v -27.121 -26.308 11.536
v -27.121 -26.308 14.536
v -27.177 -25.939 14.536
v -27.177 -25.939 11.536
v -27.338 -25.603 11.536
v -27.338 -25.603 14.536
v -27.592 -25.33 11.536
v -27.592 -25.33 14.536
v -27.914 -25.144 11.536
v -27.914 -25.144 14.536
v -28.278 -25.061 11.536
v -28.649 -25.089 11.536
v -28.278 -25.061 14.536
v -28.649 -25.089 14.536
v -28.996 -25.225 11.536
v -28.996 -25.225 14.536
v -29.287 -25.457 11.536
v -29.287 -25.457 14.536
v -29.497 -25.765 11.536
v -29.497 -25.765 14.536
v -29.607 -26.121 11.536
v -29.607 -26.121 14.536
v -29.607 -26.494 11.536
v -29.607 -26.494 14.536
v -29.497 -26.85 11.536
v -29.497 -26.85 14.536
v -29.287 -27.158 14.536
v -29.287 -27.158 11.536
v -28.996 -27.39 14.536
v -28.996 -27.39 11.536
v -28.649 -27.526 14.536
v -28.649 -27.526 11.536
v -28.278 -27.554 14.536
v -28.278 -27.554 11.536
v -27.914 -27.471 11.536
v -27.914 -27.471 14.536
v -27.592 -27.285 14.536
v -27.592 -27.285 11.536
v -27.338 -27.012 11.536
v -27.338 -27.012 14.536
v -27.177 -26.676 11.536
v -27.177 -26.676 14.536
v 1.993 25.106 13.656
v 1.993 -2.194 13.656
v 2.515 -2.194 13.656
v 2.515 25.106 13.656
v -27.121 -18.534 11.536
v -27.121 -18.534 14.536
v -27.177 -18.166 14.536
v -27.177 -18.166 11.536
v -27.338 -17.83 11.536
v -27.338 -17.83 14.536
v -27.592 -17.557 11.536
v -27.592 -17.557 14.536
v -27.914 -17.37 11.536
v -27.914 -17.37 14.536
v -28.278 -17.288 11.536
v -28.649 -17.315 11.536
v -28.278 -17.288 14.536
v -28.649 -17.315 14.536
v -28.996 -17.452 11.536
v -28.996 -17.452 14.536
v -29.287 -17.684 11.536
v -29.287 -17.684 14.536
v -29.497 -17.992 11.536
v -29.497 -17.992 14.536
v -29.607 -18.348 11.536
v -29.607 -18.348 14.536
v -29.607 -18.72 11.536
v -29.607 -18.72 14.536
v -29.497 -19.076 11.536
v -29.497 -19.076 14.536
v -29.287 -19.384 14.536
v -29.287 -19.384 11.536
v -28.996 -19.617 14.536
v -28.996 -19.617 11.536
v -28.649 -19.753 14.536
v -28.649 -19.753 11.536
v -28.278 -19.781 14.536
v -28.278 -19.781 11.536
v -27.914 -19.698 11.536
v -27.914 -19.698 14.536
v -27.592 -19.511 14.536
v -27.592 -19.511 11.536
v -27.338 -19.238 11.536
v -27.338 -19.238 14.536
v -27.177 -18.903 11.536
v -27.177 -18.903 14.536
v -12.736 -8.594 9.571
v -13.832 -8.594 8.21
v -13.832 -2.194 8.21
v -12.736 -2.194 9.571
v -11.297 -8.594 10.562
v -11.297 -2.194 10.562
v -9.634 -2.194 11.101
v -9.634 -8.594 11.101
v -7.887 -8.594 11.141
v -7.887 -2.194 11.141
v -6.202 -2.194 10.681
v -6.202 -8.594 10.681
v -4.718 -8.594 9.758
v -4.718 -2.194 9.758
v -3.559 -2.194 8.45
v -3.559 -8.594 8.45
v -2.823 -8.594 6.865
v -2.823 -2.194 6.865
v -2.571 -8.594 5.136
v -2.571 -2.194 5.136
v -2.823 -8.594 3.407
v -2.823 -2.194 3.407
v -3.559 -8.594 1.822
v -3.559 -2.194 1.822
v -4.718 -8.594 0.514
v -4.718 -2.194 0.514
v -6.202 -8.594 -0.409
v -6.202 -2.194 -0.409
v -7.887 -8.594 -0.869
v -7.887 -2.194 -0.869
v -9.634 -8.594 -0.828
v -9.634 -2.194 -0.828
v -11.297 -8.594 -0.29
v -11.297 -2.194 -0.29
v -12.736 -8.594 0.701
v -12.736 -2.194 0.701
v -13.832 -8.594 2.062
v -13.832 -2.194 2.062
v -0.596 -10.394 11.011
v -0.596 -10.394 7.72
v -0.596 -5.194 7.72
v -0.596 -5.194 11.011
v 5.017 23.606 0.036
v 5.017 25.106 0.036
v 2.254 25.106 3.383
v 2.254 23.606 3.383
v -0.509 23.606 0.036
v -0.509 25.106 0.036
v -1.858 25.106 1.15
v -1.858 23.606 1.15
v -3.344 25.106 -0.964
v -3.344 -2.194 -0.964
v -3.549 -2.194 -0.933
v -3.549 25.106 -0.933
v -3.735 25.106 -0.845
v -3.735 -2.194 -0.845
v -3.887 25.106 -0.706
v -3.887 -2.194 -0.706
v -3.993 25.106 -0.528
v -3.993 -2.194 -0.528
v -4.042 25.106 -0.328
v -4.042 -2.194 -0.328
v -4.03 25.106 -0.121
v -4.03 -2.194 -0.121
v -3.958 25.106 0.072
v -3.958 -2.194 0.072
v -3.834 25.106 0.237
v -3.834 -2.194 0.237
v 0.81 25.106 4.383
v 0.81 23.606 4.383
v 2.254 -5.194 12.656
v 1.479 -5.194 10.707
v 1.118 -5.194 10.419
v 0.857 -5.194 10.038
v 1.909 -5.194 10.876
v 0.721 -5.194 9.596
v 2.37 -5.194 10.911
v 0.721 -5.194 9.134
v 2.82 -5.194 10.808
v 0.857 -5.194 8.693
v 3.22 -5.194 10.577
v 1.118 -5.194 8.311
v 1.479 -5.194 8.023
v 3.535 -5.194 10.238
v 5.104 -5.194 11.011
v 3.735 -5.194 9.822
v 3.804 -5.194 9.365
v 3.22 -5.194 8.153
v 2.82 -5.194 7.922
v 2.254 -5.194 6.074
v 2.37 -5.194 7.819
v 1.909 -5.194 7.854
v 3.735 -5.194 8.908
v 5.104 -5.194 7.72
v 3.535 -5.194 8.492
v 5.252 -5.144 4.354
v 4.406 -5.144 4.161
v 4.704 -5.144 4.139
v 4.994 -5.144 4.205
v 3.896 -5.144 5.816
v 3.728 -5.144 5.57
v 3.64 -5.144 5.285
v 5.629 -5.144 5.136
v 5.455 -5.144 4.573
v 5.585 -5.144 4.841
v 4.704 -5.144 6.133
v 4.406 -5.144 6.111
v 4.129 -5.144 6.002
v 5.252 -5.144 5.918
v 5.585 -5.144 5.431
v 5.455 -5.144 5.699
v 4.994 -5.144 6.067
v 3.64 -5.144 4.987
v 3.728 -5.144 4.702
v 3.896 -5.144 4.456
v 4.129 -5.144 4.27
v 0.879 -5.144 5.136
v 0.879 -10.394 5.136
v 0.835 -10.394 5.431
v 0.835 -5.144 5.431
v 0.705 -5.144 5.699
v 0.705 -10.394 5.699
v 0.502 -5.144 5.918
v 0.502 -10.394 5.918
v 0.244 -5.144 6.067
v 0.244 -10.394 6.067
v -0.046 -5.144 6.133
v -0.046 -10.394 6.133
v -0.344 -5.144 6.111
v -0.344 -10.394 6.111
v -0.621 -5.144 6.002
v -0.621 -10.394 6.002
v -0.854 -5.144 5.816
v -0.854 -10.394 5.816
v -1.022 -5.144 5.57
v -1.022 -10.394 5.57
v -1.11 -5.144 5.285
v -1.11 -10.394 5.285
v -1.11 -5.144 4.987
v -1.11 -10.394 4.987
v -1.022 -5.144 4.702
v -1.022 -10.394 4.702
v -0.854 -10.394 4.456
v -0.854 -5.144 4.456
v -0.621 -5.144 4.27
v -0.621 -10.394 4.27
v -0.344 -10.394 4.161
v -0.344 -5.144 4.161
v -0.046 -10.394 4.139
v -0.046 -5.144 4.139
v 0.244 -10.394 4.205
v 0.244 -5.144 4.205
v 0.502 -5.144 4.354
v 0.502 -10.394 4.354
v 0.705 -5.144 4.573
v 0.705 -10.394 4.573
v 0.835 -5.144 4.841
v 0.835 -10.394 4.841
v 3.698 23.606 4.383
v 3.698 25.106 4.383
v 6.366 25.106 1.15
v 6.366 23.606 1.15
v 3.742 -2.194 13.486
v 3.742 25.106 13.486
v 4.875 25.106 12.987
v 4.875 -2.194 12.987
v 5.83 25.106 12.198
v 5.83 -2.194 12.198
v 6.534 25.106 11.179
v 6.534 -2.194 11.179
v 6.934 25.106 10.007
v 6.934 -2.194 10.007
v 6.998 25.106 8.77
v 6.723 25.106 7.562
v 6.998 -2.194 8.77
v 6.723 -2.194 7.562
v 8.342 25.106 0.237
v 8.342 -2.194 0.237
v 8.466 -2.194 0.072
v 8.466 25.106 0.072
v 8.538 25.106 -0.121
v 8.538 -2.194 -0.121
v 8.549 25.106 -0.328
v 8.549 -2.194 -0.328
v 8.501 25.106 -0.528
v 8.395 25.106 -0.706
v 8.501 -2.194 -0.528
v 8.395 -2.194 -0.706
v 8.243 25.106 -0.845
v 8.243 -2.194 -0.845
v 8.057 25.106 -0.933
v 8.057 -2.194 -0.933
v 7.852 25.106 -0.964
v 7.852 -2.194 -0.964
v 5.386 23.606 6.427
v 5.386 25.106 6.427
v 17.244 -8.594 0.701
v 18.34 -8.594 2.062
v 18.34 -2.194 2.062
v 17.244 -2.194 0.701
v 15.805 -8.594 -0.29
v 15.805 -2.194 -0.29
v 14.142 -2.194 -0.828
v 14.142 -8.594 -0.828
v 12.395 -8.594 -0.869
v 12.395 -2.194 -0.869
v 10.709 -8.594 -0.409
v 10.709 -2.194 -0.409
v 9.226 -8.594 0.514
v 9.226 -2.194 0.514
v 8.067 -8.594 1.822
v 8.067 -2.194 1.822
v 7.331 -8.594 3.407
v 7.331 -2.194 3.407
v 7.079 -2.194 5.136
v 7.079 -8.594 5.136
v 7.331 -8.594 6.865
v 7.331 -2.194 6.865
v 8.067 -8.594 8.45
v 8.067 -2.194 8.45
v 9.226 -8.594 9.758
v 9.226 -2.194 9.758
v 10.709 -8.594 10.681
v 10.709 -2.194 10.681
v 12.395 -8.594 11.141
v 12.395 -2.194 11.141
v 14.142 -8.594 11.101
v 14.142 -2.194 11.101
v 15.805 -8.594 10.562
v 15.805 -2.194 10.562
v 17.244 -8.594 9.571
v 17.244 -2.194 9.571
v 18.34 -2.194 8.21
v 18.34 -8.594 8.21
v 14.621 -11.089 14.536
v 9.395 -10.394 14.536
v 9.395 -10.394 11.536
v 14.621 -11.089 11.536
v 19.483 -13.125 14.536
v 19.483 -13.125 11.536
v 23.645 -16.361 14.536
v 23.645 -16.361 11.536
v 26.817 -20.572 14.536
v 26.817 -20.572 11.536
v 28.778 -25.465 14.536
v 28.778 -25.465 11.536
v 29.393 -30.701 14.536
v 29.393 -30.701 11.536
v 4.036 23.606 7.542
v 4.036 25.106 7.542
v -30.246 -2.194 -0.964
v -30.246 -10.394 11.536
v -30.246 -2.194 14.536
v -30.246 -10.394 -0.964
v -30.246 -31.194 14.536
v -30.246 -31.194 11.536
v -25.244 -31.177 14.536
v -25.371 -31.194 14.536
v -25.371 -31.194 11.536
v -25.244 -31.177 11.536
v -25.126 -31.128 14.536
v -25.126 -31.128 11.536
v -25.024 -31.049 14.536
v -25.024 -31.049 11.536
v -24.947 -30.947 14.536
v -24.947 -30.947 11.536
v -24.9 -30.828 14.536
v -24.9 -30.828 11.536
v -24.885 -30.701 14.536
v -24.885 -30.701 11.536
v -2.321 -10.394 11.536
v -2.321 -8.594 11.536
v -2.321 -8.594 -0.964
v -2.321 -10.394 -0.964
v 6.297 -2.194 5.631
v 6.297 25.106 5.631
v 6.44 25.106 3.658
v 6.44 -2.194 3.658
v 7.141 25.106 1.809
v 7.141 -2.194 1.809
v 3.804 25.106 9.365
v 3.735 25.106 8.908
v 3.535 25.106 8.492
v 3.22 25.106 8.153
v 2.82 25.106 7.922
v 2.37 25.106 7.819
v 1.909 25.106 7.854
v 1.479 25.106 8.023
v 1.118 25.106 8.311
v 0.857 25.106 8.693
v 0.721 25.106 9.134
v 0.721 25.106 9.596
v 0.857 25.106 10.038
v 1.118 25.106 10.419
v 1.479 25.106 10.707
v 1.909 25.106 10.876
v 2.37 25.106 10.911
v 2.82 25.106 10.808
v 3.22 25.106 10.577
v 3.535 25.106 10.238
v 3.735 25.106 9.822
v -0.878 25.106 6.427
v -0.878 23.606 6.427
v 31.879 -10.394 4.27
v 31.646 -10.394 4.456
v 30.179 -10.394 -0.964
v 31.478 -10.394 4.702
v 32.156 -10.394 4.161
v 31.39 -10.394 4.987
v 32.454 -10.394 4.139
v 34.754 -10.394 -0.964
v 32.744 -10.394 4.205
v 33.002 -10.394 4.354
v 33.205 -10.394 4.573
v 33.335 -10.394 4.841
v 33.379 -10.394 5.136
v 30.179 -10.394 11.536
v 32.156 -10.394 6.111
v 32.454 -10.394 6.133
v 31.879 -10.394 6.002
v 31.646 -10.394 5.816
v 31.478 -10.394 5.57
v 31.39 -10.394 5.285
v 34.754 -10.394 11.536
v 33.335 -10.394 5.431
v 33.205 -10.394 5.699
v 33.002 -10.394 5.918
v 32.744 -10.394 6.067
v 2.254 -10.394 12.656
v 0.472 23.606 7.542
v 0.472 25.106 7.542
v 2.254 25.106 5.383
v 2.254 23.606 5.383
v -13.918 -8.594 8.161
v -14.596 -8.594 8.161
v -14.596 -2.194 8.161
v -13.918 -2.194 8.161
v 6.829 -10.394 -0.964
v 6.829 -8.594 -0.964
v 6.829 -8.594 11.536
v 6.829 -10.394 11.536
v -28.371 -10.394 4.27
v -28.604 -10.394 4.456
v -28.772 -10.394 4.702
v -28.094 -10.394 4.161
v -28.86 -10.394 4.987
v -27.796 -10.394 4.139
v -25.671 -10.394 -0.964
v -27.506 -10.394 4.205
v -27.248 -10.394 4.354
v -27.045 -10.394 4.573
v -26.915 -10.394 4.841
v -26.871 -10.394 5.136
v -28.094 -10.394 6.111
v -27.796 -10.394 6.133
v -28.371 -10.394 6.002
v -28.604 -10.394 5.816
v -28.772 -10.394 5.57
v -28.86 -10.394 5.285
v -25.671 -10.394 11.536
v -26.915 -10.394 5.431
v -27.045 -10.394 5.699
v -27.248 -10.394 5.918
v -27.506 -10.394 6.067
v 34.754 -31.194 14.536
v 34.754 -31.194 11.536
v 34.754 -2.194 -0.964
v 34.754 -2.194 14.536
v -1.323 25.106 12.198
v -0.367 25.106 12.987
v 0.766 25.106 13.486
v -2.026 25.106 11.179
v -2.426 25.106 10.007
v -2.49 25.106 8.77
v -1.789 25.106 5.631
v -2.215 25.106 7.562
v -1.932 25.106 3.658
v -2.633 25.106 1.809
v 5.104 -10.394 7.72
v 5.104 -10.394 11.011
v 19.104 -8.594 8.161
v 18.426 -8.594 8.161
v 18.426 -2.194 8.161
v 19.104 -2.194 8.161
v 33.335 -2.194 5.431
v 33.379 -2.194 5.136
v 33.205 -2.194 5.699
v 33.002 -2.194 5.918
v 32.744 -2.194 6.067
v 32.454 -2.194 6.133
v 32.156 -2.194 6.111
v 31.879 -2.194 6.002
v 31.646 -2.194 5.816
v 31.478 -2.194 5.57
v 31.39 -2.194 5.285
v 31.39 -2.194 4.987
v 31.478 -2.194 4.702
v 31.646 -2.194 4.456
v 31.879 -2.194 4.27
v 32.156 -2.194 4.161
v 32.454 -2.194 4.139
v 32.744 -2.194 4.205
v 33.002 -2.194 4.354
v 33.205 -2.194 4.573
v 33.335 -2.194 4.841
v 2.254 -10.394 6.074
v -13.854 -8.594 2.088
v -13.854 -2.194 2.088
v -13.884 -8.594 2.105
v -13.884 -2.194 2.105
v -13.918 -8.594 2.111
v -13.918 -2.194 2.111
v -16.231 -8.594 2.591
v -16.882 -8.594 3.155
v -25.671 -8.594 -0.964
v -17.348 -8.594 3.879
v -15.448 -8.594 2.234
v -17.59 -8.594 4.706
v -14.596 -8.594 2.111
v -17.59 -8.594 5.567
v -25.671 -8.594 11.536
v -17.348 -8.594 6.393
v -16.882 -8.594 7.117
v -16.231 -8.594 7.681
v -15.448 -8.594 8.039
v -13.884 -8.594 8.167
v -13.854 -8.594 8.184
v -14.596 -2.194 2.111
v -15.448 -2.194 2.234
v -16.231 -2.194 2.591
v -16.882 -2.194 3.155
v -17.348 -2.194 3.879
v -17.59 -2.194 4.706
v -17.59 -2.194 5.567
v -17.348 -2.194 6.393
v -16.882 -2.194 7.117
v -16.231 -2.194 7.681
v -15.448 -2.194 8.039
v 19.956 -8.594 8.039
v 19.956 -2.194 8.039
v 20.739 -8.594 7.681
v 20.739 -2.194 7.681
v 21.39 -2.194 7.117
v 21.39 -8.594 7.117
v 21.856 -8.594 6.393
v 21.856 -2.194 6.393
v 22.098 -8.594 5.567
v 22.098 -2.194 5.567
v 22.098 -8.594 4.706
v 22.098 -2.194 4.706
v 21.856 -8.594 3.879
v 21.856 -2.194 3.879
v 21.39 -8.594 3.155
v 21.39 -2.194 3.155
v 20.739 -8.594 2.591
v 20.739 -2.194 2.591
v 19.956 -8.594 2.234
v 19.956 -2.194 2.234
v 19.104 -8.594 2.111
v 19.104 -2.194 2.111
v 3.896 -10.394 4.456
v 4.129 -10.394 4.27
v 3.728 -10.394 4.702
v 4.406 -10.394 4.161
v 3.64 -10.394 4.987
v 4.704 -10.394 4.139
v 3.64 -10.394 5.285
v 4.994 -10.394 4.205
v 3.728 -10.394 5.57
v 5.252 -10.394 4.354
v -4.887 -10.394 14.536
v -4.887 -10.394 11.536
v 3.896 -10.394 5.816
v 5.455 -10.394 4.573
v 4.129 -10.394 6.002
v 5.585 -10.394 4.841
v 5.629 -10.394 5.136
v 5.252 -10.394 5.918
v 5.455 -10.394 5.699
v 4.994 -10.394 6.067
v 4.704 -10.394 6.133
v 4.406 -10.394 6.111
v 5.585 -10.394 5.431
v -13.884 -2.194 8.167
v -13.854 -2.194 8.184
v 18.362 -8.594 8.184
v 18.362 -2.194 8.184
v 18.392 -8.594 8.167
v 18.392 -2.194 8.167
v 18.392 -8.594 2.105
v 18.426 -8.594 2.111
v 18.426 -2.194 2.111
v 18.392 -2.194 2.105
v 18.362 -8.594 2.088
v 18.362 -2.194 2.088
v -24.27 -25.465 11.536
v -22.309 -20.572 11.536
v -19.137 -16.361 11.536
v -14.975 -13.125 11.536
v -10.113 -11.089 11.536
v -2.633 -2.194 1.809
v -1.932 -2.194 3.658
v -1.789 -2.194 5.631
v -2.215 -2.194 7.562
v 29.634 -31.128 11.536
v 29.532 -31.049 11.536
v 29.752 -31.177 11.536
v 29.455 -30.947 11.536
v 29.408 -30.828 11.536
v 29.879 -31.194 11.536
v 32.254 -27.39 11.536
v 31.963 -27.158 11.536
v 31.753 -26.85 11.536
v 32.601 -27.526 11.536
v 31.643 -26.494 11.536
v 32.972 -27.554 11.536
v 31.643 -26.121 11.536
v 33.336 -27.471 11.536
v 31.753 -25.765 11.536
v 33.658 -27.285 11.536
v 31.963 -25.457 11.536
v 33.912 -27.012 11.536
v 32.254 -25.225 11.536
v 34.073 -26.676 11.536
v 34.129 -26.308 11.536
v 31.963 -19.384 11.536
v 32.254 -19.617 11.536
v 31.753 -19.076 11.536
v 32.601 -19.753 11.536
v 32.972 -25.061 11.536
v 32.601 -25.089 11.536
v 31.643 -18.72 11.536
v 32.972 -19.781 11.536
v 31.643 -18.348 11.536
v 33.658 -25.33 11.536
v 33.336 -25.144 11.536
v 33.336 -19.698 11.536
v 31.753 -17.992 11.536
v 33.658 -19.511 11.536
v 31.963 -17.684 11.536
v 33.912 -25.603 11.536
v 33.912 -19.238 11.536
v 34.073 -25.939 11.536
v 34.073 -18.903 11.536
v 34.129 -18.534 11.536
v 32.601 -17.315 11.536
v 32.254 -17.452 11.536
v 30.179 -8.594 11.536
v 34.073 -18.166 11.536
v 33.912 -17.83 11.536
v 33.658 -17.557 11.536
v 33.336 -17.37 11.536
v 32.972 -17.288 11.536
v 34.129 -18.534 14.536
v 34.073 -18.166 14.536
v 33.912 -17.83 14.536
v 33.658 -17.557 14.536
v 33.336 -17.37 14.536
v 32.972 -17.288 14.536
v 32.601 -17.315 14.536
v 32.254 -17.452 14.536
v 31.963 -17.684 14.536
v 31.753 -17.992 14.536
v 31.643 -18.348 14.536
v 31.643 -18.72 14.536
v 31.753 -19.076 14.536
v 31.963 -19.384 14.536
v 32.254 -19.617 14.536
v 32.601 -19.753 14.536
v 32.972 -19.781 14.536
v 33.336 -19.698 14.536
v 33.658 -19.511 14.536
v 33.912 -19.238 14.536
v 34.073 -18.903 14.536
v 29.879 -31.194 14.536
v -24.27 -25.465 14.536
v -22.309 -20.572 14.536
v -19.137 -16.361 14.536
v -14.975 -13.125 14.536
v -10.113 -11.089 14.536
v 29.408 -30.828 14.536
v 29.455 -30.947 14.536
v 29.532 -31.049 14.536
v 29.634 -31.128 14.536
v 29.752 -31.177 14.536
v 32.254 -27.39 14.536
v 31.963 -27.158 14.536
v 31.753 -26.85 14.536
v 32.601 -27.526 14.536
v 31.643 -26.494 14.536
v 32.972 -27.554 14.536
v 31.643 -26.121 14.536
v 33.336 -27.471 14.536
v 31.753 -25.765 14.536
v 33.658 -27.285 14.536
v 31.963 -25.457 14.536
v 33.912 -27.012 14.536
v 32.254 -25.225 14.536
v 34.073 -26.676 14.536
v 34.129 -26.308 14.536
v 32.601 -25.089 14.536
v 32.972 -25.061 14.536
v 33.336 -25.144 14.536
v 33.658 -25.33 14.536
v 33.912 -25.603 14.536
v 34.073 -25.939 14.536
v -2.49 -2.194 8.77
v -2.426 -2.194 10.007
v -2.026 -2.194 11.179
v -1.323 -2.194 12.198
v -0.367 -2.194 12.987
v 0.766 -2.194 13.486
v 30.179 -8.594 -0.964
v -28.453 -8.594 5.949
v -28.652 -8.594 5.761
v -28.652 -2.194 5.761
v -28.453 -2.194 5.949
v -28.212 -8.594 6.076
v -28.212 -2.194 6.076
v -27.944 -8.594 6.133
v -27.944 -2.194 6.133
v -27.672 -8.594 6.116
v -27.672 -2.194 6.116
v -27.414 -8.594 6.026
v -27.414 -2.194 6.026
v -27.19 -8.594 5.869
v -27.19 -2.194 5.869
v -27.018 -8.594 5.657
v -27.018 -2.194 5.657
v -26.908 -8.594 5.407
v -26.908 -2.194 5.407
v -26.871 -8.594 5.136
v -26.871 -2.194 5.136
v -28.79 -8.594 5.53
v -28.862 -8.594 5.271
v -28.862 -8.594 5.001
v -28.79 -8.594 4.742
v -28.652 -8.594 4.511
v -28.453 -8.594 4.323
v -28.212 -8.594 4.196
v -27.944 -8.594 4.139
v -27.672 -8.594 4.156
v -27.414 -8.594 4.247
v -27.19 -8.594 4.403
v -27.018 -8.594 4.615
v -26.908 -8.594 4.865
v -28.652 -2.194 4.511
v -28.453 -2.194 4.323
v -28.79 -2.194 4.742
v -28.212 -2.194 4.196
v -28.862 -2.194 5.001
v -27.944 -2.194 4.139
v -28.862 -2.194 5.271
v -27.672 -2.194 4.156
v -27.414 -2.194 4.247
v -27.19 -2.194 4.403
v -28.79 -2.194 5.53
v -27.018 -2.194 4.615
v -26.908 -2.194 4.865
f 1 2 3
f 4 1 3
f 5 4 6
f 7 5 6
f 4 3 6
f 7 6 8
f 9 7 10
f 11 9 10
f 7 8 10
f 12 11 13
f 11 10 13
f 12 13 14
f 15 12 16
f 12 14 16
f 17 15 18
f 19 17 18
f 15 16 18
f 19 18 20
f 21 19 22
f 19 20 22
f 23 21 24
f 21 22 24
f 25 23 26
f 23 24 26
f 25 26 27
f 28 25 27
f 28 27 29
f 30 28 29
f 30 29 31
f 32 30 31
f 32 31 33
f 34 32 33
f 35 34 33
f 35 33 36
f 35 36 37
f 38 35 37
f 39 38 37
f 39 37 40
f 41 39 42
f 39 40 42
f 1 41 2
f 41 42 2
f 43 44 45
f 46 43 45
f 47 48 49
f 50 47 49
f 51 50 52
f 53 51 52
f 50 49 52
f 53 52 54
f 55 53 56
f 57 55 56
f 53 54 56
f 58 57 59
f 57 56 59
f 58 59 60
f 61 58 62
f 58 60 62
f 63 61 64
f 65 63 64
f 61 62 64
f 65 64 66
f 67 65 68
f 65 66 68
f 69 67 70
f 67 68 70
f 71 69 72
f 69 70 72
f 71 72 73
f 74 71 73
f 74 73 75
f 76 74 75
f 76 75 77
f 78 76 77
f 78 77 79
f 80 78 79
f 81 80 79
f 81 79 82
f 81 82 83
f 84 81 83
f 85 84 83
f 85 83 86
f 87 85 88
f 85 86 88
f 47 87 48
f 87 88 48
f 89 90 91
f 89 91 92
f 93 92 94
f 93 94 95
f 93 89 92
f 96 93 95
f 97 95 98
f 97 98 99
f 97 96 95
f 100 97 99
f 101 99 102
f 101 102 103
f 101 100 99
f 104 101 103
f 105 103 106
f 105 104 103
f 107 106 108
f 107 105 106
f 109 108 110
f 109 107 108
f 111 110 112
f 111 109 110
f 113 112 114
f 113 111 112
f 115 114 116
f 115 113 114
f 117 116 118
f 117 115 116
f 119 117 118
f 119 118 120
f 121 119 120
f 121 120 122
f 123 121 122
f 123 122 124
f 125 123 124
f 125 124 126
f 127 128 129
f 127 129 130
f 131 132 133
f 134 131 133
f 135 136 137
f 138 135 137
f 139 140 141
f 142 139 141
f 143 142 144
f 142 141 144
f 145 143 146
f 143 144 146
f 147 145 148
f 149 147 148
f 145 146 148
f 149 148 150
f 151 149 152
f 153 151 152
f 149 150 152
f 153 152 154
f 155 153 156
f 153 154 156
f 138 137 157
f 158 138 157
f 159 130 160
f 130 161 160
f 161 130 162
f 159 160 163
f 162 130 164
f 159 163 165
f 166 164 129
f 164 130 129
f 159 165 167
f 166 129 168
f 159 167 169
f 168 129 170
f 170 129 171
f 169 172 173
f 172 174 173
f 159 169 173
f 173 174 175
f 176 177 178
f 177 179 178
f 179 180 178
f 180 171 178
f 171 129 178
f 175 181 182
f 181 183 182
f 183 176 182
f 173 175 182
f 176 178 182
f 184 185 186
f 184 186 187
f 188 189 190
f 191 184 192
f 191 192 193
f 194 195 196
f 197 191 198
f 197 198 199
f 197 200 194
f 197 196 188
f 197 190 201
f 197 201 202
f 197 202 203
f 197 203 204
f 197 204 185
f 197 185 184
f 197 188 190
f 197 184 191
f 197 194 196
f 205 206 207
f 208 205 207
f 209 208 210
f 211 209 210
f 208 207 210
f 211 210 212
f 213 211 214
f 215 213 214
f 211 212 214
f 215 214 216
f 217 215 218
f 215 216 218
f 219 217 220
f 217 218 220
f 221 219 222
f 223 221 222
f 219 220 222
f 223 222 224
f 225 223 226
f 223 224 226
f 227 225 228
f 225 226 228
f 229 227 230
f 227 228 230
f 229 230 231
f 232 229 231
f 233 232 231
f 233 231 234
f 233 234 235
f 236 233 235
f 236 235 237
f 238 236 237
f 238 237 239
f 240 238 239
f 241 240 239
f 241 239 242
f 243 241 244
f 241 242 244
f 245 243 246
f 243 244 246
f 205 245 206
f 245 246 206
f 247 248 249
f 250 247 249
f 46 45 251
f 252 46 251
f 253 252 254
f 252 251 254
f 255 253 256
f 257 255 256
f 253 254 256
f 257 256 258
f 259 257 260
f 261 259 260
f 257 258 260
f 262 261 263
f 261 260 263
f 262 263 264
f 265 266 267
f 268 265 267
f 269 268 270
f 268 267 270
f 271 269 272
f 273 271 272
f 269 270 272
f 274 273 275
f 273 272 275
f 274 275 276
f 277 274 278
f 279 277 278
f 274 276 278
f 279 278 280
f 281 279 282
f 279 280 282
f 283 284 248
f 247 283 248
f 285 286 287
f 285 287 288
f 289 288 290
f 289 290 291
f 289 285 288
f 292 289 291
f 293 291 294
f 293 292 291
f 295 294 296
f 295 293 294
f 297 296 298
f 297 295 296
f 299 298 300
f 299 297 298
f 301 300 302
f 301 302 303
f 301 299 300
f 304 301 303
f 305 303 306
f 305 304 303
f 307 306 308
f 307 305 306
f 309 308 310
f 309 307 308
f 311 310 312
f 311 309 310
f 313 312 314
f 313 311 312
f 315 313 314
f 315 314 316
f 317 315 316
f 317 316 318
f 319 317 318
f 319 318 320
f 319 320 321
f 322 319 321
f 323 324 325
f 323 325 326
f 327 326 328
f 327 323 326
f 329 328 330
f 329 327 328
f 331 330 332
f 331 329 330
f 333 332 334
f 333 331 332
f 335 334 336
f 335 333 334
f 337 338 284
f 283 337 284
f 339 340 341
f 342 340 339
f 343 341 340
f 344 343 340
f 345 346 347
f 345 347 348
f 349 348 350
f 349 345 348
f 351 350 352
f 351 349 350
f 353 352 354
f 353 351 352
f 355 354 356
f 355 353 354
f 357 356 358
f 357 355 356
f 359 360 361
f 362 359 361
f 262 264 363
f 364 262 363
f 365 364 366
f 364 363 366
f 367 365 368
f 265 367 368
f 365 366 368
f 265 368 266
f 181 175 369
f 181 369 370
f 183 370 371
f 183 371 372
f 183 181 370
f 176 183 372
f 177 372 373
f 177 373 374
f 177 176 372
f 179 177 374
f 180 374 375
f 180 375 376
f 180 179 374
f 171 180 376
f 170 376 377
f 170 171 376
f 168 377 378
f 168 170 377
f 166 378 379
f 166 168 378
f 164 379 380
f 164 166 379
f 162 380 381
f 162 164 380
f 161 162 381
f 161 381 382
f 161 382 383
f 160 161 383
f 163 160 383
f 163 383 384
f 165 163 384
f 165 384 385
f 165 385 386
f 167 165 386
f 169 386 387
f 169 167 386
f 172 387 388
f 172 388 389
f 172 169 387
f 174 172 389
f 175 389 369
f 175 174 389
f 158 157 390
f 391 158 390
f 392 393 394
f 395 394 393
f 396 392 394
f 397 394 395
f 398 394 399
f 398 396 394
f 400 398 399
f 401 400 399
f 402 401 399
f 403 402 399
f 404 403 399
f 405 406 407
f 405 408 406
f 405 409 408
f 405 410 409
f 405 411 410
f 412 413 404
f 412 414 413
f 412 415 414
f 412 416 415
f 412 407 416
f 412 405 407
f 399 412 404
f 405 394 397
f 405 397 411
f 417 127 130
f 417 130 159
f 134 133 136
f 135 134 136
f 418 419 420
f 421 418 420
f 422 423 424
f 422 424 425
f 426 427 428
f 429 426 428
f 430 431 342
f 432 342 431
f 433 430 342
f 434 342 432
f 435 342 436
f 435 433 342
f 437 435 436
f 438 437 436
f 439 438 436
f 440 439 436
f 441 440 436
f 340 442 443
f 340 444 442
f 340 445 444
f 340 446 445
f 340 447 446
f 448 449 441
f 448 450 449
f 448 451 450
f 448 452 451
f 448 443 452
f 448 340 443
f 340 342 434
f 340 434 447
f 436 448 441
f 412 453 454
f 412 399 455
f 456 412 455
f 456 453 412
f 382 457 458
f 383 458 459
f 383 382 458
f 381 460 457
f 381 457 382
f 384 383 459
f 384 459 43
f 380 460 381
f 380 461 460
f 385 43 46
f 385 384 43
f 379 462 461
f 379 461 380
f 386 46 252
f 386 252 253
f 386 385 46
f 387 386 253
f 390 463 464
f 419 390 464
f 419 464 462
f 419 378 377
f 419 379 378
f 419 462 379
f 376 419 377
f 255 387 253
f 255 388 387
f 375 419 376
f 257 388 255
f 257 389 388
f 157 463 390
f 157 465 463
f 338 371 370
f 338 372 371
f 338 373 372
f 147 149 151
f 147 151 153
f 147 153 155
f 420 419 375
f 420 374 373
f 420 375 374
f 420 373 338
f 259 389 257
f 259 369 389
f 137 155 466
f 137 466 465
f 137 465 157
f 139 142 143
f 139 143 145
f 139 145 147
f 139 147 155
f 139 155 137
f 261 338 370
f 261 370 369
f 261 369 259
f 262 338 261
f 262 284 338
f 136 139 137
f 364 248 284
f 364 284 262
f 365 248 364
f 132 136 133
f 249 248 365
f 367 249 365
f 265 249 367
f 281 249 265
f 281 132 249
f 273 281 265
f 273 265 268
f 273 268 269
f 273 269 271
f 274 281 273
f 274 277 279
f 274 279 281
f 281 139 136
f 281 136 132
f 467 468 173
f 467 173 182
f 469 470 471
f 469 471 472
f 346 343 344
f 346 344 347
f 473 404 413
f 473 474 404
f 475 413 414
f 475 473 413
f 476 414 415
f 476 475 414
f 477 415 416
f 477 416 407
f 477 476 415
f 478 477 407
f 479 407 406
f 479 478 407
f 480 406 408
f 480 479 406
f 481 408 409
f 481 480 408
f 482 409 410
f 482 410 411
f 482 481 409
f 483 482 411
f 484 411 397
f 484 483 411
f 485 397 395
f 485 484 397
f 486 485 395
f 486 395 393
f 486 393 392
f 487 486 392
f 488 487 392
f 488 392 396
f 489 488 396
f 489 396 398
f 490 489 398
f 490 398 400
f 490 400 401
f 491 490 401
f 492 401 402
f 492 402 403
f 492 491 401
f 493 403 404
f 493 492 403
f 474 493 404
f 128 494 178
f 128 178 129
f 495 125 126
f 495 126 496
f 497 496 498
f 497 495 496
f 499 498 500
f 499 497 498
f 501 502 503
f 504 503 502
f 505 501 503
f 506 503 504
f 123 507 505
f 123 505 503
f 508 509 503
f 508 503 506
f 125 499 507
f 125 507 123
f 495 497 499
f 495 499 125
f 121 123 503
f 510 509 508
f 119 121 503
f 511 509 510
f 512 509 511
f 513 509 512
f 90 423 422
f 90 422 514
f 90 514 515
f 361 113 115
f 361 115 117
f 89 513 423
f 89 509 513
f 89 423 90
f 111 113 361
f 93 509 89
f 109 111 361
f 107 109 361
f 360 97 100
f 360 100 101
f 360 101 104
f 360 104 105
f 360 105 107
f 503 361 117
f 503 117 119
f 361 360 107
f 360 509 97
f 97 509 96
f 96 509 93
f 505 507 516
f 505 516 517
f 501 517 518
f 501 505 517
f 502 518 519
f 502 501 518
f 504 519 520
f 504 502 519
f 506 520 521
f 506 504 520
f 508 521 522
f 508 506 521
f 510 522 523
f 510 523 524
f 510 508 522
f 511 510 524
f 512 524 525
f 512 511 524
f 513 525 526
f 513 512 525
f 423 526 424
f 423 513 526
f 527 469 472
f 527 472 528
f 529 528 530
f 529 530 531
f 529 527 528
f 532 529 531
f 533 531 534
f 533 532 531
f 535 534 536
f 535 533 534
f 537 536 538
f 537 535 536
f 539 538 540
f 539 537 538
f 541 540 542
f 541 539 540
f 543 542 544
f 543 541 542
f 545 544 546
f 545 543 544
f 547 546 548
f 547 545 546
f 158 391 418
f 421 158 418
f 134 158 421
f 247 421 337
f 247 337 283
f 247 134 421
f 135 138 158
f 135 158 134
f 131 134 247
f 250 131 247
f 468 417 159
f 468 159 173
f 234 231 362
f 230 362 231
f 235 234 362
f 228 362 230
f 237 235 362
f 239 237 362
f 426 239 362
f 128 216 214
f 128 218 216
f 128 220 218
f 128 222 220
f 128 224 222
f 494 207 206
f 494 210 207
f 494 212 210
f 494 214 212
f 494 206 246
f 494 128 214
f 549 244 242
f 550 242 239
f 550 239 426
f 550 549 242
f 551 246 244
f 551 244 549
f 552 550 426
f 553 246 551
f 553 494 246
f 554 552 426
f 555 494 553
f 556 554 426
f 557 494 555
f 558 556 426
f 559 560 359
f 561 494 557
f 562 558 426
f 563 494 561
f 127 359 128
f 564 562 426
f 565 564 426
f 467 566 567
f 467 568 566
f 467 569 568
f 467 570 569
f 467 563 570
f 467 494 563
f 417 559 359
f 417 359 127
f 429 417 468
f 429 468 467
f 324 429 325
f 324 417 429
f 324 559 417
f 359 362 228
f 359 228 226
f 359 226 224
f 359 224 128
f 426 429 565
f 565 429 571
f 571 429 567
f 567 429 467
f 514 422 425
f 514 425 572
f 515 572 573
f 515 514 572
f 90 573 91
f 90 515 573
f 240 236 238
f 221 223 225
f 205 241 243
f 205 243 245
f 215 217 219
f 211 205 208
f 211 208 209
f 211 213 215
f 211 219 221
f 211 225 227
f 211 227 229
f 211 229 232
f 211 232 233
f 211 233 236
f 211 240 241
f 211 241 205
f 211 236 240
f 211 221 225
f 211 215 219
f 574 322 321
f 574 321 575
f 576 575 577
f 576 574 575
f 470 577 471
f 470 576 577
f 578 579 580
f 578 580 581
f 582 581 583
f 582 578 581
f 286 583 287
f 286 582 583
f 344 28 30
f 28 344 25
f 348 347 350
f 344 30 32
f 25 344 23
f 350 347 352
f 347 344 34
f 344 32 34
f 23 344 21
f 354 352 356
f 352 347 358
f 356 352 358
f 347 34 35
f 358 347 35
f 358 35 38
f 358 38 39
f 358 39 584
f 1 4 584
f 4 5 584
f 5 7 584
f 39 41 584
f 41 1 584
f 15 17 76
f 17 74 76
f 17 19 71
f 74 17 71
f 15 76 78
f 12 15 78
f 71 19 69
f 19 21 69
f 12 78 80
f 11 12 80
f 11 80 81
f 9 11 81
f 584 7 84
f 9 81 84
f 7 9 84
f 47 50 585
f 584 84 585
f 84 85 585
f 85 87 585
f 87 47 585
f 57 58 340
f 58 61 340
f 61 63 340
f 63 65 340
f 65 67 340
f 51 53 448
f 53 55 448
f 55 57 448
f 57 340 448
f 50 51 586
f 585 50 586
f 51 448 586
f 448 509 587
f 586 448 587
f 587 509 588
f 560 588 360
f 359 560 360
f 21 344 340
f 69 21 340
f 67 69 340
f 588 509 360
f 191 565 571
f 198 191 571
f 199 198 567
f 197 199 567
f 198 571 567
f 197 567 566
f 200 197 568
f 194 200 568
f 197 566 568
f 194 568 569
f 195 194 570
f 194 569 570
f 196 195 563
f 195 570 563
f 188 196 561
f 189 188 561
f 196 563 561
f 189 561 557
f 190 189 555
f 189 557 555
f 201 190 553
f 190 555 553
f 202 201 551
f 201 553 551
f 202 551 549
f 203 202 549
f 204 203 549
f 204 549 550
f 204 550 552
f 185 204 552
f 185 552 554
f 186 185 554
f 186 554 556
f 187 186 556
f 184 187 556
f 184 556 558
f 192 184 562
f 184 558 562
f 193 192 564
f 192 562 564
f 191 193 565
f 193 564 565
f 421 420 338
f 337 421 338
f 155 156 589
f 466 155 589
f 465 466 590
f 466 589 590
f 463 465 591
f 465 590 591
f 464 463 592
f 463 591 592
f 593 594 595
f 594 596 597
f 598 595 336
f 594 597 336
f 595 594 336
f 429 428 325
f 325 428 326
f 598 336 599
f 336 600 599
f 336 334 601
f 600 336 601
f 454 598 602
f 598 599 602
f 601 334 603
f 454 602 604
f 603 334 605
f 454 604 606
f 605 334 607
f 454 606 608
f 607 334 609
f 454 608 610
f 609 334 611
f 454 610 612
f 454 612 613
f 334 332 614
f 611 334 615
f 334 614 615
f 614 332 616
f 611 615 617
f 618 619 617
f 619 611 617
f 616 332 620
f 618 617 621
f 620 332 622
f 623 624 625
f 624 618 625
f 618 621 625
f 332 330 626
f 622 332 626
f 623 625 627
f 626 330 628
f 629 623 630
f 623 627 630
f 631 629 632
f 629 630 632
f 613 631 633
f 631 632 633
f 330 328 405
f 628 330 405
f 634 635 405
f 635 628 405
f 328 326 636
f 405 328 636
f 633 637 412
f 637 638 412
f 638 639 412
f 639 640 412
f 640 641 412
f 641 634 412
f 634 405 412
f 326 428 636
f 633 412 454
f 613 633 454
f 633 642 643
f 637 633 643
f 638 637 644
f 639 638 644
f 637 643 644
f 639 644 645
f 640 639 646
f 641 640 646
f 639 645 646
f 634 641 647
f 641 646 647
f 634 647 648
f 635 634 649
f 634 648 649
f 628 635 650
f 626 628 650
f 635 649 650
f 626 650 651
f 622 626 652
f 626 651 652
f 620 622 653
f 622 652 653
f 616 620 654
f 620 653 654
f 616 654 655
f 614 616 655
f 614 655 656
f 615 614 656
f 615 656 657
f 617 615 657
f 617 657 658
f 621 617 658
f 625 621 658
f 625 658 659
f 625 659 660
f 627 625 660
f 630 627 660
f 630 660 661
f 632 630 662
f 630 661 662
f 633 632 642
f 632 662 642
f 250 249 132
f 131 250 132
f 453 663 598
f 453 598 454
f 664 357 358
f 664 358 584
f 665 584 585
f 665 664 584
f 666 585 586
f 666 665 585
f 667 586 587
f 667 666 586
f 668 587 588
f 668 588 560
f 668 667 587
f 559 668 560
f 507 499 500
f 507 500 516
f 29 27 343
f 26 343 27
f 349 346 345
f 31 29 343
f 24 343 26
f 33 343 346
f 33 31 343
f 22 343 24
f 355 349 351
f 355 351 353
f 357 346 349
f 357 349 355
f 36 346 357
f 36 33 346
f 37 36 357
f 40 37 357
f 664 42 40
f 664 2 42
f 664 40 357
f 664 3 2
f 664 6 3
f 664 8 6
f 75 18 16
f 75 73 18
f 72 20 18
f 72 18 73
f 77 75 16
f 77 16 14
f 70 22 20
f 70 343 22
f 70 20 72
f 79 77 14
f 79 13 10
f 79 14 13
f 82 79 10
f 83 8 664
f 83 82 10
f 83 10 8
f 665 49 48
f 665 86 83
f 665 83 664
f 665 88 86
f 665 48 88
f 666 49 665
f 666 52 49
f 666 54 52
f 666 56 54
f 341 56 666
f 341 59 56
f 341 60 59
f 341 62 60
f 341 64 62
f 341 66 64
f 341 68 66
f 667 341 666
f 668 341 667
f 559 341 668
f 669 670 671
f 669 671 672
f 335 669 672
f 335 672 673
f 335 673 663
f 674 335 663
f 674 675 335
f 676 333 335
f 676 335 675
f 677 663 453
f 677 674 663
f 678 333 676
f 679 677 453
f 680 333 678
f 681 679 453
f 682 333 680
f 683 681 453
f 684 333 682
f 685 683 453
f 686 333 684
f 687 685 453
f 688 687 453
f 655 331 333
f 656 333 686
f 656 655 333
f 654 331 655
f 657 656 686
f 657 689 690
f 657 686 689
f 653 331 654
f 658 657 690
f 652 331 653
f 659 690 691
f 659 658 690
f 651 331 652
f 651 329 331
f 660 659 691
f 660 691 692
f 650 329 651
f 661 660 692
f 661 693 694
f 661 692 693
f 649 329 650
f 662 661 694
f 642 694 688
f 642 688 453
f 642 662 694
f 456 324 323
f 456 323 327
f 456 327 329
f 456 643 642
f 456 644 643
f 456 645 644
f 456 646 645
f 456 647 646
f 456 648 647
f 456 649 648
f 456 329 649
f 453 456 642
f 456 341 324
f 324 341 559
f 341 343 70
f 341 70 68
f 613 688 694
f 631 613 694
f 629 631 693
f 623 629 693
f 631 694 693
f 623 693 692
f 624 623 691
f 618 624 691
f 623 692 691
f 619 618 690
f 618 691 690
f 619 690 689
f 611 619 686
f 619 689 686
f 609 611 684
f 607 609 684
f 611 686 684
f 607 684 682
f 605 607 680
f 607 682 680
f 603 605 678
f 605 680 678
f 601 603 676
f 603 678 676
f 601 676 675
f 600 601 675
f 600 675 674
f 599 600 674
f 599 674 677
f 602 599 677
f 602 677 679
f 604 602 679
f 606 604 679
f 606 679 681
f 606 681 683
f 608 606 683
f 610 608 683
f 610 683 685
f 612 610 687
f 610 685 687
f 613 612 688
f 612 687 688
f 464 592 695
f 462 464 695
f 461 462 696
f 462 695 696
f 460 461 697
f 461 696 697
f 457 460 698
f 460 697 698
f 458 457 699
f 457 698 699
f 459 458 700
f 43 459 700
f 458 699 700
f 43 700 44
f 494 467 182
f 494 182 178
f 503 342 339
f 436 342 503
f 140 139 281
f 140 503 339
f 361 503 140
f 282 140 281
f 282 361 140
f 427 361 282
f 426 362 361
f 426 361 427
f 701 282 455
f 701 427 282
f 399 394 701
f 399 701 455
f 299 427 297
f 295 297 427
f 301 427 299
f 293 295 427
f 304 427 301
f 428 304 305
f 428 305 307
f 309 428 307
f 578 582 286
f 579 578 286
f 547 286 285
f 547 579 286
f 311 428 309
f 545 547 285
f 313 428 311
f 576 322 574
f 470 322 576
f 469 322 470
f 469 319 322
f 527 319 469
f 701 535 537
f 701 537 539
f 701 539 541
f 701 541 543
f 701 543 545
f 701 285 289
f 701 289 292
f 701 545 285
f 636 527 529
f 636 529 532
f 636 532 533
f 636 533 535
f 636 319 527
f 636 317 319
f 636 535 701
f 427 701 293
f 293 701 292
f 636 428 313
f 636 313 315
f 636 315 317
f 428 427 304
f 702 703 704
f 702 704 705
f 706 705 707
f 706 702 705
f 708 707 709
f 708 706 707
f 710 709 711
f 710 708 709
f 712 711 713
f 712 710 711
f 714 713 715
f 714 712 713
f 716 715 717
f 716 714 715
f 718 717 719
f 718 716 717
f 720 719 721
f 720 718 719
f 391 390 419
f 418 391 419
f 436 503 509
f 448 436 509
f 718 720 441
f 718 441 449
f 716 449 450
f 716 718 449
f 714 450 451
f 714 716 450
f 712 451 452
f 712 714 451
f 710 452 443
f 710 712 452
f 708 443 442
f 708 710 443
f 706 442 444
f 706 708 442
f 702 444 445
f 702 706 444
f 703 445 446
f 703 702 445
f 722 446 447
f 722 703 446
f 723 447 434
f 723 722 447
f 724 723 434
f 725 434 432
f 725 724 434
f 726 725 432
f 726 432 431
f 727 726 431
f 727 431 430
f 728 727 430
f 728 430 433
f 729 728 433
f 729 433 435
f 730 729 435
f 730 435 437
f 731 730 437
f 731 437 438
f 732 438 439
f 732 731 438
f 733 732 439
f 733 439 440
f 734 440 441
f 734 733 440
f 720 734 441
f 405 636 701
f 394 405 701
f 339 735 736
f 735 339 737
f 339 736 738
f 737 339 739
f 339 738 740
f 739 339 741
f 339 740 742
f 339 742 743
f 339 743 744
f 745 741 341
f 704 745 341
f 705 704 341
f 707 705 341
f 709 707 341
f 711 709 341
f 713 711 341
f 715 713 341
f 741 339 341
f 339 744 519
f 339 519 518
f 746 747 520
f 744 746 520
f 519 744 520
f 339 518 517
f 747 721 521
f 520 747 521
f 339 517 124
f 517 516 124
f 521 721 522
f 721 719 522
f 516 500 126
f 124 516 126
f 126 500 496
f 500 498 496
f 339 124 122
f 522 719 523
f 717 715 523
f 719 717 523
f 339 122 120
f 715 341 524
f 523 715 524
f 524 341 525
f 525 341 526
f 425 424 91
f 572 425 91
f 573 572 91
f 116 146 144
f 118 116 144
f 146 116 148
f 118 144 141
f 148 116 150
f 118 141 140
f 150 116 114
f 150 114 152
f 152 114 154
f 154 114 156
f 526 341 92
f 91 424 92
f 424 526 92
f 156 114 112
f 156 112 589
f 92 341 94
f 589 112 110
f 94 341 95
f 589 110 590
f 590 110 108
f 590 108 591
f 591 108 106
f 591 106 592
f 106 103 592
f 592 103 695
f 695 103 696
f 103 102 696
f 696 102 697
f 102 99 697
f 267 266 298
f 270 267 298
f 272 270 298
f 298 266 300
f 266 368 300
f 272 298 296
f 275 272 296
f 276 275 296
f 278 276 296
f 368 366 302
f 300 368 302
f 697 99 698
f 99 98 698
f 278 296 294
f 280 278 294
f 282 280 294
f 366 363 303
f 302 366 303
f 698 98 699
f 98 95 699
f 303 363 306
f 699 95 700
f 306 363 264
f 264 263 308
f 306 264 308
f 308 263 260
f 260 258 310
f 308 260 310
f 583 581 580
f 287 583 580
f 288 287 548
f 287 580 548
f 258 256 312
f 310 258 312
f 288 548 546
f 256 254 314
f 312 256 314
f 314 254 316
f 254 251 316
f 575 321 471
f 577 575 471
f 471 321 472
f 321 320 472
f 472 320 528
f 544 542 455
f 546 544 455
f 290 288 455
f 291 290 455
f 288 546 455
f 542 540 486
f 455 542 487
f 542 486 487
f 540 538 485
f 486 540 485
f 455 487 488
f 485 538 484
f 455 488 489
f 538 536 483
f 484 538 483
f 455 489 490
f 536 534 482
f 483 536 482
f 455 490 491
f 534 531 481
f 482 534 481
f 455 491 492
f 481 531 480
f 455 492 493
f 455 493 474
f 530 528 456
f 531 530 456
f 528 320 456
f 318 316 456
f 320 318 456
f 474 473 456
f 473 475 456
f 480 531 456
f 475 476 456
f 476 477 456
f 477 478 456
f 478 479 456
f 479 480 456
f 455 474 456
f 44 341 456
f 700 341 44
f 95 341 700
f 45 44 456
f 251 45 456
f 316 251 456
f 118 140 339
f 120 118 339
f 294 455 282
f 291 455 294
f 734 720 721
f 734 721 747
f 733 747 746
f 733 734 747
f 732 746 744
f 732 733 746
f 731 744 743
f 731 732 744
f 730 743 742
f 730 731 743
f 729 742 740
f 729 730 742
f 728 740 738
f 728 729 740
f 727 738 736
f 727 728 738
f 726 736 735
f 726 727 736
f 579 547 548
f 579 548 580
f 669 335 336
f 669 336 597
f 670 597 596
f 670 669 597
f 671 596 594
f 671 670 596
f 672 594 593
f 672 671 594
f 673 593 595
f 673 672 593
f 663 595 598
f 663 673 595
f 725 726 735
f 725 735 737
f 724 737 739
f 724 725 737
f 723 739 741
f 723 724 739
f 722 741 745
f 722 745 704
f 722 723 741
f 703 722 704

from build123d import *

# Parameters (mm, degrees)
BOSS_EXTRUDE1_START = -1.8
SKETCH1_R           = 1
BOSS_EXTRUDE1_DEPTH = 1.8
BOSS_EXTRUDE2_START = -1.8
SKETCH1_5_R         = 1
SKETCH1_5_W         = 23.35
SKETCH1_5_H         = 12.5
SKETCH1_5_W_2       = 0.2
SKETCH1_5_H_2       = 11.7
BOSS_EXTRUDE2_DEPTH = 6.4
SKETCH1_6_R         = 1
CUT_EXTRUDE9_DEPTH  = 5.25
SKETCH6_R           = 1.25
BOSS_EXTRUDE4_DEPTH = 3
CUT_EXTRUDE6_START  = -8.2
SKETCH4_6_R         = 1.55
CUT_EXTRUDE6_DEPTH  = 5.2
BOSS_EXTRUDE3_DEPTH = 27.3
CUT_EXTRUDE7_START  = -3
SKETCH4_7_R         = 1.55
CUT_EXTRUDE7_DEPTH  = 30.3
CUT_EXTRUDE8_DEPTH  = 1.5


with BuildPart() as part:
    # Sketch1 → Boss-Extrude1 (new body)
    with BuildSketch(Plane.XZ.offset(10.394345176).offset(BOSS_EXTRUDE1_START)):
        Polygon((-30.246052812, 14.536068682), (-30.246052812, -0.963931318), (-25.671052812, -0.963931318), (-25.671052812, 11.536068682), (-2.321052812, 11.536068682), (-2.321052812, -0.963931318), (6.828947188, -0.963931318), (6.828947188, 11.536068682), (30.178947188, 11.536068682), (30.178947188, -0.963931318), (34.753947188, -0.963931318), (34.753947188, 14.536068682), align=None)
        with Locations((-27.871052812, 5.136068682)):
            Circle(SKETCH1_R, mode=Mode.SUBTRACT)
        with Locations((32.378947188, 5.136068682)):
            Circle(SKETCH1_R, mode=Mode.SUBTRACT)
    extrude(amount=BOSS_EXTRUDE1_DEPTH)

    # Sketch1_5 → Boss-Extrude2 (add)
    with BuildSketch(Plane.XZ.offset(10.394345176).offset(BOSS_EXTRUDE2_START)):
        with BuildLine():
            Line((-30.246052812, 14.536068682), (-30.246052812, -0.963931318))
            Line((-30.246052812, -0.963931318), (-25.671052812, -0.963931318))
            Line((-25.671052812, -0.963931318), (-25.671052812, -0.713931318))
            Line((-25.671052812, -0.713931318), (-29.746052812, -0.713931318))
            ThreePointArc((-29.746052812, -0.713931318), (-29.922829508, -0.640708013), (-29.996052812, -0.463931318))
            Line((-29.996052812, -0.463931318), (-29.996052812, 4.511068682))
            Line((-29.996052812, 4.511068682), (-28.651677562, 4.511068682))
            ThreePointArc((-28.651677562, 4.511068682), (-28.871052812, 5.136068682), (-28.651677562, 5.761068682))
            Line((-28.651677562, 5.761068682), (-29.996052812, 5.761068682))
            Line((-29.996052812, 5.761068682), (-29.996052812, 10.736068682))
            ThreePointArc((-29.996052812, 10.736068682), (-29.922829508, 10.912845377), (-29.746052812, 10.986068682))
            Line((-29.746052812, 10.986068682), (-25.671052812, 10.986068682))
            Line((-25.671052812, 10.986068682), (-25.671052812, 11.536068682))
            Line((-25.671052812, 11.536068682), (-2.321052812, 11.536068682))
            Line((-2.321052812, 11.536068682), (-2.321052812, -0.963931318))
            Line((-2.321052812, -0.963931318), (6.828947188, -0.963931318))
            Line((6.828947188, -0.963931318), (6.828947188, 11.536068682))
            Line((6.828947188, 11.536068682), (30.178947188, 11.536068682))
            Line((30.178947188, 11.536068682), (30.178947188, -0.963931318))
            Line((30.178947188, -0.963931318), (34.753947188, -0.963931318))
            Line((34.753947188, -0.963931318), (34.753947188, 14.536068682))
            Line((34.753947188, 14.536068682), (2.253947188, 14.536068682))
            Line((2.253947188, 14.536068682), (-30.246052812, 14.536068682))
        make_face()
        with Locations((-0.121052812, 5.136068682)):
            Circle(SKETCH1_5_R, mode=Mode.SUBTRACT)
        with Locations((4.628947188, 5.136068682)):
            Circle(SKETCH1_5_R, mode=Mode.SUBTRACT)
        with Locations((32.378947188, 5.136068682)):
            Circle(SKETCH1_5_R, mode=Mode.SUBTRACT)
        with Locations((18.503947188, 5.286068682)):
            Rectangle(SKETCH1_5_W, SKETCH1_5_H)
        with BuildLine():
            Line((19.103947188, 2.111068682), (18.425821266, 2.111068682))
            ThreePointArc((18.425821266, 2.111068682), (18.376229436, 2.097905601), (18.339693232, 2.06188169))
            ThreePointArc((18.339693232, 2.06188169), (7.078947188, 5.136068682), (18.339693232, 8.210255674))
            ThreePointArc((18.339693232, 8.210255674), (18.376229436, 8.174231764), (18.425821266, 8.161068682))
            Line((18.425821266, 8.161068682), (19.103947188, 8.161068682))
            ThreePointArc((19.103947188, 8.161068682), (22.128947188, 5.136068682), (19.103947188, 2.111068682))
        make_face(mode=Mode.SUBTRACT)
        Polygon((-25.671052812, -0.713931318), (-25.671052812, -0.963931318), (-2.321052812, -0.963931318), (-2.321052812, 11.536068682), (-25.671052812, 11.536068682), (-25.671052812, 10.986068682), (-25.471052812, 10.986068682), (-25.471052812, -0.713931318), align=None)
        with BuildLine():
            ThreePointArc((-13.831798857, 2.06188169), (-13.868335061, 2.097905601), (-13.917926891, 2.111068682))
            Line((-13.917926891, 2.111068682), (-14.596052812, 2.111068682))
            ThreePointArc((-14.596052812, 2.111068682), (-17.621052812, 5.136068682), (-14.596052812, 8.161068682))
            Line((-14.596052812, 8.161068682), (-13.917926891, 8.161068682))
            ThreePointArc((-13.917926891, 8.161068682), (-13.868335061, 8.174231764), (-13.831798857, 8.210255674))
            ThreePointArc((-13.831798857, 8.210255674), (-2.571052812, 5.136068682), (-13.831798857, 2.06188169))
        make_face(mode=Mode.SUBTRACT)
        with BuildLine():
            Line((-29.746052812, -0.713931318), (-25.671052812, -0.713931318))
            Line((-25.671052812, -0.713931318), (-25.671052812, 10.986068682))
            Line((-25.671052812, 10.986068682), (-29.746052812, 10.986068682))
            ThreePointArc((-29.746052812, 10.986068682), (-29.922829508, 10.912845377), (-29.996052812, 10.736068682))
            Line((-29.996052812, 10.736068682), (-29.996052812, 5.761068682))
            Line((-29.996052812, 5.761068682), (-28.651677562, 5.761068682))
            ThreePointArc((-28.651677562, 5.761068682), (-27.539861591, 6.079632339), (-26.871052812, 5.136068682))
            ThreePointArc((-26.871052812, 5.136068682), (-27.539861591, 4.192505025), (-28.651677562, 4.511068682))
            Line((-28.651677562, 4.511068682), (-29.996052812, 4.511068682))
            Line((-29.996052812, 4.511068682), (-29.996052812, -0.463931318))
            ThreePointArc((-29.996052812, -0.463931318), (-29.922829508, -0.640708013), (-29.746052812, -0.713931318))
        make_face()
        with Locations((-25.571052812, 5.136068682)):
            Rectangle(SKETCH1_5_W_2, SKETCH1_5_H_2)
        with Locations((4.628947188, 5.136068682)):
            Circle(SKETCH1_5_R)
        with Locations((-0.121052812, 5.136068682)):
            Circle(SKETCH1_5_R)
    extrude(amount=-BOSS_EXTRUDE2_DEPTH)

    # Sketch1_6 → Cut-Extrude9 (cut)
    with BuildSketch(Plane.XZ.offset(10.394345176)):
        with Locations((4.628947188, 5.136068682)):
            Circle(SKETCH1_6_R)
        with Locations((-0.121052812, 5.136068682)):
            Circle(SKETCH1_6_R)
    extrude(amount=-CUT_EXTRUDE9_DEPTH, mode=Mode.SUBTRACT)

    # Sketch6 → Boss-Extrude4 (add)
    with BuildSketch(Plane.XY.offset(14.536068682)):
        with BuildLine():
            Line((34.753947188, -10.394345176), (9.394953593, -10.394345176))
            ThreePointArc((9.394953593, -10.394345176), (23.644922083, -16.360870979), (29.392610104, -30.700505374))
            ThreePointArc((29.392610104, -30.700505374), (29.532392174, -31.049241035), (29.878947188, -31.194345176))
            Line((29.878947188, -31.194345176), (34.753947188, -31.194345176))
            Line((34.753947188, -31.194345176), (34.753947188, -10.394345176))
        make_face()
        with Locations((32.878947188, -26.30759383)):
            Circle(SKETCH6_R, mode=Mode.SUBTRACT)
        with Locations((32.878947188, -18.534091138)):
            Circle(SKETCH6_R, mode=Mode.SUBTRACT)
        with BuildLine():
            Line((-4.887059217, -10.394345176), (-30.246052812, -10.394345176))
            Line((-30.246052812, -10.394345176), (-30.246052812, -16.729871547))
            Line((-30.246052812, -16.729871547), (-28.371052812, -15.647339792))
            Line((-28.371052812, -15.647339792), (-25.871052812, -17.090715465))
            Line((-25.871052812, -17.090715465), (-25.871052812, -19.977466811))
            Line((-25.871052812, -19.977466811), (-28.371052812, -21.420842484))
            Line((-28.371052812, -21.420842484), (-30.246052812, -20.338310729))
            Line((-30.246052812, -20.338310729), (-30.246052812, -24.503374239))
            Line((-30.246052812, -24.503374239), (-28.371052812, -23.420842484))
            Line((-28.371052812, -23.420842484), (-25.871052812, -24.864218157))
            Line((-25.871052812, -24.864218157), (-25.871052812, -27.750969503))
            Line((-25.871052812, -27.750969503), (-28.371052812, -29.194345176))
            Line((-28.371052812, -29.194345176), (-30.246052812, -28.111813421))
            Line((-30.246052812, -28.111813421), (-30.246052812, -31.194345176))
            Line((-30.246052812, -31.194345176), (-25.371052812, -31.194345176))
            ThreePointArc((-25.371052812, -31.194345176), (-25.024497799, -31.049241035), (-24.884715729, -30.700505374))
            ThreePointArc((-24.884715729, -30.700505374), (-19.137027708, -16.360870979), (-4.887059217, -10.394345176))
        make_face()
        Polygon((-28.371052812, -23.420842484), (-30.246052812, -24.503374239), (-30.246052812, -28.111813421), (-28.371052812, -29.194345176), (-25.871052812, -27.750969503), (-25.871052812, -24.864218157), align=None)
        with Locations((-28.371052812, -26.30759383)):
            Circle(SKETCH6_R, mode=Mode.SUBTRACT)
        Polygon((-28.371052812, -15.647339792), (-30.246052812, -16.729871547), (-30.246052812, -20.338310729), (-28.371052812, -21.420842484), (-25.871052812, -19.977466811), (-25.871052812, -17.090715465), align=None)
        with Locations((-28.371052812, -18.534091138)):
            Circle(SKETCH6_R, mode=Mode.SUBTRACT)
    extrude(amount=-BOSS_EXTRUDE4_DEPTH)

    # Sketch4_6 → Cut-Extrude6 (cut)
    with BuildSketch(Plane(origin=(0, -2.194345176, 0), x_dir=(1, 0, 0), z_dir=(0, 1, 0)).offset(CUT_EXTRUDE6_START)):
        Polygon((5.103947188, -11.010607671), (5.103947188, -7.719711137), (2.253947188, -6.07426287), (-0.596052812, -7.719711137), (-0.596052812, -11.010607671), (2.253947188, -12.656055938), align=None)
        with Locations((2.253947188, -9.365159404)):
            Circle(SKETCH4_6_R, mode=Mode.SUBTRACT)
        with Locations((2.253947188, -9.365159404)):
            Circle(SKETCH4_6_R)
    extrude(amount=CUT_EXTRUDE6_DEPTH, mode=Mode.SUBTRACT)

    # Sketch4 → Boss-Extrude3 (add)
    with BuildSketch(Plane(origin=(0, -2.194345176, 0), x_dir=(1, 0, 0), z_dir=(0, 1, 0))):
        with BuildLine():
            Line((1.993192449, -13.656055938), (2.514701927, -13.656055938))
            ThreePointArc((2.514701927, -13.656055938), (6.217553798, -11.71318089), (6.722992999, -7.562228392))
            ThreePointArc((6.722992999, -7.562228392), (6.440270151, -3.658198764), (8.34156903, -0.236730934))
            ThreePointArc((8.34156903, -0.236730934), (8.500600778, 0.528068047), (7.852347904, 0.963931318))
            Line((7.852347904, 0.963931318), (-3.344453529, 0.963931318))
            ThreePointArc((-3.344453529, 0.963931318), (-3.992706402, 0.528068047), (-3.833674654, -0.236730934))
            ThreePointArc((-3.833674654, -0.236730934), (-1.932375775, -3.658198764), (-2.215098624, -7.562228392))
            ThreePointArc((-2.215098624, -7.562228392), (-1.709659423, -11.71318089), (1.993192449, -13.656055938))
        make_face()
    extrude(amount=BOSS_EXTRUDE3_DEPTH)

    # Sketch4_7 → Cut-Extrude7 (cut)
    with BuildSketch(Plane(origin=(0, -2.194345176, 0), x_dir=(1, 0, 0), z_dir=(0, 1, 0)).offset(CUT_EXTRUDE7_START)):
        with Locations((2.253947188, -9.365159404)):
            Circle(SKETCH4_7_R)
    extrude(amount=CUT_EXTRUDE7_DEPTH, mode=Mode.SUBTRACT)

    # Sketch5 → Cut-Extrude8 (cut)
    with BuildSketch(Plane(origin=(0, 25.105654824, 0), x_dir=(1, 0, 0), z_dir=(0, 1, 0))):
        Polygon((5.385896038, -6.427447361), (3.697691675, -4.382517944), (6.366164089, -1.150185498), (5.016629458, -0.036068682), (2.253947188, -3.382517944), (-0.508735082, -0.036068682), (-1.858269713, -1.150185498), (0.8102027, -4.382517944), (-0.878001663, -6.427447361), (0.471532968, -7.541564177), (2.253947188, -5.382517944), (4.036361407, -7.541564177), align=None)
    extrude(amount=-CUT_EXTRUDE8_DEPTH, mode=Mode.SUBTRACT)


solid = part.part
